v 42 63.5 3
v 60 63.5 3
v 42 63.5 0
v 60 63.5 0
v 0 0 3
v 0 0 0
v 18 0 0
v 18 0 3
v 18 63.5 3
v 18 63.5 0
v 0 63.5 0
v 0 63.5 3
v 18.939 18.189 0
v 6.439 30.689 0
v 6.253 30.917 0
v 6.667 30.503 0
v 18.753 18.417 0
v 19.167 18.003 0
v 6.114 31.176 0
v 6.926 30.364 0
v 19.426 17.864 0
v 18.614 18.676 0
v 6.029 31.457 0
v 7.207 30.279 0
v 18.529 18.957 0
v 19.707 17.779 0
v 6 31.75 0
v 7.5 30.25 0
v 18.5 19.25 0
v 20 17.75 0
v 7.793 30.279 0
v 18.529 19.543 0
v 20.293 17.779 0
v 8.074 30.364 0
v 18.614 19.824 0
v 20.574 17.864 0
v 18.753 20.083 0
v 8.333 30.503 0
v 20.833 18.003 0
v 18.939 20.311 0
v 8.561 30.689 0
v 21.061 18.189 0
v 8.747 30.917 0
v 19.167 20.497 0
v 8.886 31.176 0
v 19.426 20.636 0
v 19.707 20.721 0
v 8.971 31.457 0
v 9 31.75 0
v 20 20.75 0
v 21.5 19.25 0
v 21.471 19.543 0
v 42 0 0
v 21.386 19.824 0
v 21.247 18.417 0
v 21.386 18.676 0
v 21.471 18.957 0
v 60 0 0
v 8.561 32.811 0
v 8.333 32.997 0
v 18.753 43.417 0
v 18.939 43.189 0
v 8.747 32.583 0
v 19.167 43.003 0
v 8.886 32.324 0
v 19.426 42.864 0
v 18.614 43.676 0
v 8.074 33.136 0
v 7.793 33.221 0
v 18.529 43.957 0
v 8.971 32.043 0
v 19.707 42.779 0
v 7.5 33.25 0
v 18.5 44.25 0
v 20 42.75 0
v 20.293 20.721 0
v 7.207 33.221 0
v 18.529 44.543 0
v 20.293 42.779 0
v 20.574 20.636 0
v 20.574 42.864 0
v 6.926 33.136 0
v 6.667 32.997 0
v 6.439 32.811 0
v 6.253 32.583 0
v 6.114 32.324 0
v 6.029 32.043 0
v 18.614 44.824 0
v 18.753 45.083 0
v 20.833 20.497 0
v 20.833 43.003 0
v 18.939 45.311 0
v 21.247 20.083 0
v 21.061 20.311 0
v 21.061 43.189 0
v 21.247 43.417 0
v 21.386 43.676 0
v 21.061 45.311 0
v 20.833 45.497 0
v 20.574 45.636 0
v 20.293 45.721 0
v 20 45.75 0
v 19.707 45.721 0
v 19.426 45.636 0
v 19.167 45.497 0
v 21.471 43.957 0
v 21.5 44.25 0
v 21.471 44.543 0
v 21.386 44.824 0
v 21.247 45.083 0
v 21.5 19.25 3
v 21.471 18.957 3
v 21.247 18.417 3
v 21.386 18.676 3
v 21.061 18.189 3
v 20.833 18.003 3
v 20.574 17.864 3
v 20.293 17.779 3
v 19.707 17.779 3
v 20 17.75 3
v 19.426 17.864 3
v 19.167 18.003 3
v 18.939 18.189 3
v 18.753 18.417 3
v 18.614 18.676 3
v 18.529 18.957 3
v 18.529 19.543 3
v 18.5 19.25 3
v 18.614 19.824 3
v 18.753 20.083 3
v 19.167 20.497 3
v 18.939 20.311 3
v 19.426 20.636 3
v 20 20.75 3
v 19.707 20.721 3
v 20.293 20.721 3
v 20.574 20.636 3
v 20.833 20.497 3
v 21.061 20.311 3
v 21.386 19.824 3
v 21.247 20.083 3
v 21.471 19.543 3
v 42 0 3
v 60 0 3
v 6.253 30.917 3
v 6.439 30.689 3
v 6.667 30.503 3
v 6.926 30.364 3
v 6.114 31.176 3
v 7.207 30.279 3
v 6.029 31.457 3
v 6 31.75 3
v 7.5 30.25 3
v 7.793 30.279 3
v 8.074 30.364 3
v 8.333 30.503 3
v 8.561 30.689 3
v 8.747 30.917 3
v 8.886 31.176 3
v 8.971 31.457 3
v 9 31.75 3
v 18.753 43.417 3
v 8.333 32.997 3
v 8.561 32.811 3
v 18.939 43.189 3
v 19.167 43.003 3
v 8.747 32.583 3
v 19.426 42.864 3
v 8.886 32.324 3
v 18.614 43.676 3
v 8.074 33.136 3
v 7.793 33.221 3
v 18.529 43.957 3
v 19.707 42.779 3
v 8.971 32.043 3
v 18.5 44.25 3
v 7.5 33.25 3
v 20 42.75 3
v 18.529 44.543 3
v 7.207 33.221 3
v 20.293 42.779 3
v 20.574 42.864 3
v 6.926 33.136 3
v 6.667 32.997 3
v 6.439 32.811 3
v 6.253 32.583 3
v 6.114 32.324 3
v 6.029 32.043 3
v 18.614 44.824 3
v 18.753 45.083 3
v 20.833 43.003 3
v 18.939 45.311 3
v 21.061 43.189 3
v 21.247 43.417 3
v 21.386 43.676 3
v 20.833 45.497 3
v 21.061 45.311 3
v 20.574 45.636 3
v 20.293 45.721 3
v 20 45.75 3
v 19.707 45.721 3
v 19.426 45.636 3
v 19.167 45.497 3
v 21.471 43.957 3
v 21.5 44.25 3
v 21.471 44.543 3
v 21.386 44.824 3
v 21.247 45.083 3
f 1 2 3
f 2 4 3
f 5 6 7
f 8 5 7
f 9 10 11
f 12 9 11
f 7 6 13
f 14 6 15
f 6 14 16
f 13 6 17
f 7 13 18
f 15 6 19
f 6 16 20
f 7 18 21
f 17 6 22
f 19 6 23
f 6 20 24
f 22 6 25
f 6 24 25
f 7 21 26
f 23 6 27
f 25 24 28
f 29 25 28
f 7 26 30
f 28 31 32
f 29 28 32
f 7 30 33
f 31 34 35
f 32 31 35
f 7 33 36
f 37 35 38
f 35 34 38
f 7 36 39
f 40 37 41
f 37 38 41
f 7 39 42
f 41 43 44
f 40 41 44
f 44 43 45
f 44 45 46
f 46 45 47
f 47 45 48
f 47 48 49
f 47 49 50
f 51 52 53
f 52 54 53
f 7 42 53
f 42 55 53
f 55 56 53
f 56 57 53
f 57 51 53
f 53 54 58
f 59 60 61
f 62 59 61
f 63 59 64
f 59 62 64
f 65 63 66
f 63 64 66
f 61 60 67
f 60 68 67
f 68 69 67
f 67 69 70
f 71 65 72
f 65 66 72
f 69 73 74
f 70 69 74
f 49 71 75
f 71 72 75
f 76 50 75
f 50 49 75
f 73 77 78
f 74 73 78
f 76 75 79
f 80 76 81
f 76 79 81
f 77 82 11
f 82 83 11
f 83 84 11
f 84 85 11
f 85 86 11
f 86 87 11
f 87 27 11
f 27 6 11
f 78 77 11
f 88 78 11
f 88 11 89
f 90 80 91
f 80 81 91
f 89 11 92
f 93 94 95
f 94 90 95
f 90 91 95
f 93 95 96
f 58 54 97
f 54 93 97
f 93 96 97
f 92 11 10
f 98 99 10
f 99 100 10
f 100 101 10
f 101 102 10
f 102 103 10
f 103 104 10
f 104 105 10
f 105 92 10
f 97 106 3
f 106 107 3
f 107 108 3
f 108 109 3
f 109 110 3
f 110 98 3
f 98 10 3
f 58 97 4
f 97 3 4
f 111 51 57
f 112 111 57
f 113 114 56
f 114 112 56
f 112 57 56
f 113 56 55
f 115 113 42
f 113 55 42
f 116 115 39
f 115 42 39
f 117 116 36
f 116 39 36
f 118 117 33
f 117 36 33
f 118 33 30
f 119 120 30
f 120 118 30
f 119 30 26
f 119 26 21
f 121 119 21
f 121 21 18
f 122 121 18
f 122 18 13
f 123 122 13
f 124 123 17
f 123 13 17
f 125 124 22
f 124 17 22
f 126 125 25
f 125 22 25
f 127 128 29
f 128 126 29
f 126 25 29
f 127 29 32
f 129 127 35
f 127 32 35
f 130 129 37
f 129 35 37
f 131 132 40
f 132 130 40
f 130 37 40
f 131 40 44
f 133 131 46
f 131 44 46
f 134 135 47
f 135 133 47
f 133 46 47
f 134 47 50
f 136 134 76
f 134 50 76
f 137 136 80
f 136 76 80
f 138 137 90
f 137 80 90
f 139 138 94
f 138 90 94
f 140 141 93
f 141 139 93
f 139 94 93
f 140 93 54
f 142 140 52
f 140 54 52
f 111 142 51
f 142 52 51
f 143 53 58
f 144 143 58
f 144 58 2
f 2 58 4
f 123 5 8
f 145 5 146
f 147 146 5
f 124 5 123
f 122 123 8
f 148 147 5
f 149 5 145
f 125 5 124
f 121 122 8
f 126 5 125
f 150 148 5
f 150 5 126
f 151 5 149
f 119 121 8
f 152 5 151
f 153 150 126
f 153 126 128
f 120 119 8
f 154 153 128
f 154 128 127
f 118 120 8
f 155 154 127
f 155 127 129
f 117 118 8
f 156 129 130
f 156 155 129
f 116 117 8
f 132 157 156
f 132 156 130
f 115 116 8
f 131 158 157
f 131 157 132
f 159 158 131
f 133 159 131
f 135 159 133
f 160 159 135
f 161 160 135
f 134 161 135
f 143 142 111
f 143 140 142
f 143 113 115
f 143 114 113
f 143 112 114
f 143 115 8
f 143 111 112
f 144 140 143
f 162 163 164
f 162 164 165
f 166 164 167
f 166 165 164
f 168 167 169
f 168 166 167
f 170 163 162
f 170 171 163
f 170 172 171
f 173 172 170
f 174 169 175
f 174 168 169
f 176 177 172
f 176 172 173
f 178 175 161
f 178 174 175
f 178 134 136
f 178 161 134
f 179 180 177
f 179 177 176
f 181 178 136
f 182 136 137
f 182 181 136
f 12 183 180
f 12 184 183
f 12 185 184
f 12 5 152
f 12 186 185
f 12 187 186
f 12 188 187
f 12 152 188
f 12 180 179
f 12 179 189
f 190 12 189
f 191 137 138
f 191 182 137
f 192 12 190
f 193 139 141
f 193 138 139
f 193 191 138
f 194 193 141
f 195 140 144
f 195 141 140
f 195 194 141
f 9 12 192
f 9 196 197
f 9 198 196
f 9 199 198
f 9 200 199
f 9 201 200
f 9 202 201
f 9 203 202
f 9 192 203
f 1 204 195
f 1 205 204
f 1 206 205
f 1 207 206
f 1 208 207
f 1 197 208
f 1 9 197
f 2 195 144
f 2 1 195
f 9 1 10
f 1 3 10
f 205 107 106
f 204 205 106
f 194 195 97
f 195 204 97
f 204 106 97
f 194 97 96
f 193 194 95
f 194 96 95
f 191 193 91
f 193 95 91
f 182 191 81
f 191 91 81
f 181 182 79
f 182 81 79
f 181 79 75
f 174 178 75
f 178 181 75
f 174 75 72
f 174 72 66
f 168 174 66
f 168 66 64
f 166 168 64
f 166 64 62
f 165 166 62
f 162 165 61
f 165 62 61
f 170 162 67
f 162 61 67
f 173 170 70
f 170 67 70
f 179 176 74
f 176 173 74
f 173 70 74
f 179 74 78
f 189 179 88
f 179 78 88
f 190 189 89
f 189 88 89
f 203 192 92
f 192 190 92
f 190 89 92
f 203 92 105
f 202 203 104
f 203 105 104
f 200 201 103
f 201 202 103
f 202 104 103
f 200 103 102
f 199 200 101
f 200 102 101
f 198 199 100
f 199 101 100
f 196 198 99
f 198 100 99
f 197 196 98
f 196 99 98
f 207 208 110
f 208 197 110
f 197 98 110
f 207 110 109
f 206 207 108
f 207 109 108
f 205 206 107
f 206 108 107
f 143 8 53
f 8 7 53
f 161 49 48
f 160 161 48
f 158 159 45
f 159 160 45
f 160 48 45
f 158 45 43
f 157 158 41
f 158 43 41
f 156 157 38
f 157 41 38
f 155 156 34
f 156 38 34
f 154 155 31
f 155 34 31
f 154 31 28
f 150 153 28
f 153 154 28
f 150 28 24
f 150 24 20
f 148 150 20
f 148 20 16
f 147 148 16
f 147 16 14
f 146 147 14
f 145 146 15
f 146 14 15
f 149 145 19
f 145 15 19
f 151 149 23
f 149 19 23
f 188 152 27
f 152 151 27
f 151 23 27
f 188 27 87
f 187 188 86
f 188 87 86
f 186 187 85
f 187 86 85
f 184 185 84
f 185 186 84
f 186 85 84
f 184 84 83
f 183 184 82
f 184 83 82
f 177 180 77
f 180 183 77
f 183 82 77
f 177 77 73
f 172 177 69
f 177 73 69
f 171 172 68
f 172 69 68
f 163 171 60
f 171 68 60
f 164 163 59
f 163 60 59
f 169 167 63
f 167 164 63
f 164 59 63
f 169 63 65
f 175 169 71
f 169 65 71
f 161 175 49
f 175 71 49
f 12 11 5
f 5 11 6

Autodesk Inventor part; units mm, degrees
ref_plane "YZ Plane" through (0, 0, 0) normal (1, 0, 0) x (0, 1, 0)
ref_plane "XZ Plane" through (0, 0, 0) normal (0, 1, 0) x (-1, 0, 0)
ref_plane "XY Plane" through (0, 0, 0) normal (0, 0, 1) x (1, 0, 0)
sketch "Sketch1" plane through (0, 0, 0) normal (0, 0, 1) x (1, 0, 0)
  line L0 (0, 0) -> (0, 63.5) construction
  line L1 (60, 0) -> (60, 63.5) construction
  line L2 (18, 66.5) -> (42, 66.5) construction
  line L3 (42, 0) -> (18, 0) construction
  circle A0 centre (20, 19.25) radius 1.5 projected
  circle A1 centre (10.45, 31.75) radius 1.35 construction
  circle A2 centre (20, 44.25) radius 1.5 projected
  line L4 (0, 0) -> (60, 0)
  line L5 (60, 0) -> (60, 63.5)
  line L6 (60, 63.5) -> (0, 63.5)
  line L7 (0, 63.5) -> (0, 0)
  circle A3 centre (20, 44.25) radius 1.5 projected
  circle A4 centre (7.5, 31.75) radius 1.5 projected
  circle A5 centre (20, 19.25) radius 1.5 projected
  line L8 (60, 0) -> (42, 0) projected
  line L9 (60, 0) -> (60, 63.5) projected
  line L10 (42, 63.5) -> (60, 63.5) projected
  line L11 (42, 63.5) -> (42, 66.5) projected
  line L12 (18, 66.5) -> (42, 66.5) projected
  line L13 (18, 63.5) -> (18, 66.5) projected
  line L14 (0, 63.5) -> (18, 63.5) projected
  line L15 (0, 0) -> (0, 63.5) projected
  line L16 (18, 0) -> (0, 0) projected
  line L17 (18, 0) -> (18, -3) projected
  line L18 (18, -3) -> (42, -3) projected
  line L19 (42, 0) -> (42, -3) projected
extrude "Extrusion2" add sketch "Sketch1" along normal blind 3 contours L7 L6 L5 L4
properties part number "Pan cross bar spacer"
